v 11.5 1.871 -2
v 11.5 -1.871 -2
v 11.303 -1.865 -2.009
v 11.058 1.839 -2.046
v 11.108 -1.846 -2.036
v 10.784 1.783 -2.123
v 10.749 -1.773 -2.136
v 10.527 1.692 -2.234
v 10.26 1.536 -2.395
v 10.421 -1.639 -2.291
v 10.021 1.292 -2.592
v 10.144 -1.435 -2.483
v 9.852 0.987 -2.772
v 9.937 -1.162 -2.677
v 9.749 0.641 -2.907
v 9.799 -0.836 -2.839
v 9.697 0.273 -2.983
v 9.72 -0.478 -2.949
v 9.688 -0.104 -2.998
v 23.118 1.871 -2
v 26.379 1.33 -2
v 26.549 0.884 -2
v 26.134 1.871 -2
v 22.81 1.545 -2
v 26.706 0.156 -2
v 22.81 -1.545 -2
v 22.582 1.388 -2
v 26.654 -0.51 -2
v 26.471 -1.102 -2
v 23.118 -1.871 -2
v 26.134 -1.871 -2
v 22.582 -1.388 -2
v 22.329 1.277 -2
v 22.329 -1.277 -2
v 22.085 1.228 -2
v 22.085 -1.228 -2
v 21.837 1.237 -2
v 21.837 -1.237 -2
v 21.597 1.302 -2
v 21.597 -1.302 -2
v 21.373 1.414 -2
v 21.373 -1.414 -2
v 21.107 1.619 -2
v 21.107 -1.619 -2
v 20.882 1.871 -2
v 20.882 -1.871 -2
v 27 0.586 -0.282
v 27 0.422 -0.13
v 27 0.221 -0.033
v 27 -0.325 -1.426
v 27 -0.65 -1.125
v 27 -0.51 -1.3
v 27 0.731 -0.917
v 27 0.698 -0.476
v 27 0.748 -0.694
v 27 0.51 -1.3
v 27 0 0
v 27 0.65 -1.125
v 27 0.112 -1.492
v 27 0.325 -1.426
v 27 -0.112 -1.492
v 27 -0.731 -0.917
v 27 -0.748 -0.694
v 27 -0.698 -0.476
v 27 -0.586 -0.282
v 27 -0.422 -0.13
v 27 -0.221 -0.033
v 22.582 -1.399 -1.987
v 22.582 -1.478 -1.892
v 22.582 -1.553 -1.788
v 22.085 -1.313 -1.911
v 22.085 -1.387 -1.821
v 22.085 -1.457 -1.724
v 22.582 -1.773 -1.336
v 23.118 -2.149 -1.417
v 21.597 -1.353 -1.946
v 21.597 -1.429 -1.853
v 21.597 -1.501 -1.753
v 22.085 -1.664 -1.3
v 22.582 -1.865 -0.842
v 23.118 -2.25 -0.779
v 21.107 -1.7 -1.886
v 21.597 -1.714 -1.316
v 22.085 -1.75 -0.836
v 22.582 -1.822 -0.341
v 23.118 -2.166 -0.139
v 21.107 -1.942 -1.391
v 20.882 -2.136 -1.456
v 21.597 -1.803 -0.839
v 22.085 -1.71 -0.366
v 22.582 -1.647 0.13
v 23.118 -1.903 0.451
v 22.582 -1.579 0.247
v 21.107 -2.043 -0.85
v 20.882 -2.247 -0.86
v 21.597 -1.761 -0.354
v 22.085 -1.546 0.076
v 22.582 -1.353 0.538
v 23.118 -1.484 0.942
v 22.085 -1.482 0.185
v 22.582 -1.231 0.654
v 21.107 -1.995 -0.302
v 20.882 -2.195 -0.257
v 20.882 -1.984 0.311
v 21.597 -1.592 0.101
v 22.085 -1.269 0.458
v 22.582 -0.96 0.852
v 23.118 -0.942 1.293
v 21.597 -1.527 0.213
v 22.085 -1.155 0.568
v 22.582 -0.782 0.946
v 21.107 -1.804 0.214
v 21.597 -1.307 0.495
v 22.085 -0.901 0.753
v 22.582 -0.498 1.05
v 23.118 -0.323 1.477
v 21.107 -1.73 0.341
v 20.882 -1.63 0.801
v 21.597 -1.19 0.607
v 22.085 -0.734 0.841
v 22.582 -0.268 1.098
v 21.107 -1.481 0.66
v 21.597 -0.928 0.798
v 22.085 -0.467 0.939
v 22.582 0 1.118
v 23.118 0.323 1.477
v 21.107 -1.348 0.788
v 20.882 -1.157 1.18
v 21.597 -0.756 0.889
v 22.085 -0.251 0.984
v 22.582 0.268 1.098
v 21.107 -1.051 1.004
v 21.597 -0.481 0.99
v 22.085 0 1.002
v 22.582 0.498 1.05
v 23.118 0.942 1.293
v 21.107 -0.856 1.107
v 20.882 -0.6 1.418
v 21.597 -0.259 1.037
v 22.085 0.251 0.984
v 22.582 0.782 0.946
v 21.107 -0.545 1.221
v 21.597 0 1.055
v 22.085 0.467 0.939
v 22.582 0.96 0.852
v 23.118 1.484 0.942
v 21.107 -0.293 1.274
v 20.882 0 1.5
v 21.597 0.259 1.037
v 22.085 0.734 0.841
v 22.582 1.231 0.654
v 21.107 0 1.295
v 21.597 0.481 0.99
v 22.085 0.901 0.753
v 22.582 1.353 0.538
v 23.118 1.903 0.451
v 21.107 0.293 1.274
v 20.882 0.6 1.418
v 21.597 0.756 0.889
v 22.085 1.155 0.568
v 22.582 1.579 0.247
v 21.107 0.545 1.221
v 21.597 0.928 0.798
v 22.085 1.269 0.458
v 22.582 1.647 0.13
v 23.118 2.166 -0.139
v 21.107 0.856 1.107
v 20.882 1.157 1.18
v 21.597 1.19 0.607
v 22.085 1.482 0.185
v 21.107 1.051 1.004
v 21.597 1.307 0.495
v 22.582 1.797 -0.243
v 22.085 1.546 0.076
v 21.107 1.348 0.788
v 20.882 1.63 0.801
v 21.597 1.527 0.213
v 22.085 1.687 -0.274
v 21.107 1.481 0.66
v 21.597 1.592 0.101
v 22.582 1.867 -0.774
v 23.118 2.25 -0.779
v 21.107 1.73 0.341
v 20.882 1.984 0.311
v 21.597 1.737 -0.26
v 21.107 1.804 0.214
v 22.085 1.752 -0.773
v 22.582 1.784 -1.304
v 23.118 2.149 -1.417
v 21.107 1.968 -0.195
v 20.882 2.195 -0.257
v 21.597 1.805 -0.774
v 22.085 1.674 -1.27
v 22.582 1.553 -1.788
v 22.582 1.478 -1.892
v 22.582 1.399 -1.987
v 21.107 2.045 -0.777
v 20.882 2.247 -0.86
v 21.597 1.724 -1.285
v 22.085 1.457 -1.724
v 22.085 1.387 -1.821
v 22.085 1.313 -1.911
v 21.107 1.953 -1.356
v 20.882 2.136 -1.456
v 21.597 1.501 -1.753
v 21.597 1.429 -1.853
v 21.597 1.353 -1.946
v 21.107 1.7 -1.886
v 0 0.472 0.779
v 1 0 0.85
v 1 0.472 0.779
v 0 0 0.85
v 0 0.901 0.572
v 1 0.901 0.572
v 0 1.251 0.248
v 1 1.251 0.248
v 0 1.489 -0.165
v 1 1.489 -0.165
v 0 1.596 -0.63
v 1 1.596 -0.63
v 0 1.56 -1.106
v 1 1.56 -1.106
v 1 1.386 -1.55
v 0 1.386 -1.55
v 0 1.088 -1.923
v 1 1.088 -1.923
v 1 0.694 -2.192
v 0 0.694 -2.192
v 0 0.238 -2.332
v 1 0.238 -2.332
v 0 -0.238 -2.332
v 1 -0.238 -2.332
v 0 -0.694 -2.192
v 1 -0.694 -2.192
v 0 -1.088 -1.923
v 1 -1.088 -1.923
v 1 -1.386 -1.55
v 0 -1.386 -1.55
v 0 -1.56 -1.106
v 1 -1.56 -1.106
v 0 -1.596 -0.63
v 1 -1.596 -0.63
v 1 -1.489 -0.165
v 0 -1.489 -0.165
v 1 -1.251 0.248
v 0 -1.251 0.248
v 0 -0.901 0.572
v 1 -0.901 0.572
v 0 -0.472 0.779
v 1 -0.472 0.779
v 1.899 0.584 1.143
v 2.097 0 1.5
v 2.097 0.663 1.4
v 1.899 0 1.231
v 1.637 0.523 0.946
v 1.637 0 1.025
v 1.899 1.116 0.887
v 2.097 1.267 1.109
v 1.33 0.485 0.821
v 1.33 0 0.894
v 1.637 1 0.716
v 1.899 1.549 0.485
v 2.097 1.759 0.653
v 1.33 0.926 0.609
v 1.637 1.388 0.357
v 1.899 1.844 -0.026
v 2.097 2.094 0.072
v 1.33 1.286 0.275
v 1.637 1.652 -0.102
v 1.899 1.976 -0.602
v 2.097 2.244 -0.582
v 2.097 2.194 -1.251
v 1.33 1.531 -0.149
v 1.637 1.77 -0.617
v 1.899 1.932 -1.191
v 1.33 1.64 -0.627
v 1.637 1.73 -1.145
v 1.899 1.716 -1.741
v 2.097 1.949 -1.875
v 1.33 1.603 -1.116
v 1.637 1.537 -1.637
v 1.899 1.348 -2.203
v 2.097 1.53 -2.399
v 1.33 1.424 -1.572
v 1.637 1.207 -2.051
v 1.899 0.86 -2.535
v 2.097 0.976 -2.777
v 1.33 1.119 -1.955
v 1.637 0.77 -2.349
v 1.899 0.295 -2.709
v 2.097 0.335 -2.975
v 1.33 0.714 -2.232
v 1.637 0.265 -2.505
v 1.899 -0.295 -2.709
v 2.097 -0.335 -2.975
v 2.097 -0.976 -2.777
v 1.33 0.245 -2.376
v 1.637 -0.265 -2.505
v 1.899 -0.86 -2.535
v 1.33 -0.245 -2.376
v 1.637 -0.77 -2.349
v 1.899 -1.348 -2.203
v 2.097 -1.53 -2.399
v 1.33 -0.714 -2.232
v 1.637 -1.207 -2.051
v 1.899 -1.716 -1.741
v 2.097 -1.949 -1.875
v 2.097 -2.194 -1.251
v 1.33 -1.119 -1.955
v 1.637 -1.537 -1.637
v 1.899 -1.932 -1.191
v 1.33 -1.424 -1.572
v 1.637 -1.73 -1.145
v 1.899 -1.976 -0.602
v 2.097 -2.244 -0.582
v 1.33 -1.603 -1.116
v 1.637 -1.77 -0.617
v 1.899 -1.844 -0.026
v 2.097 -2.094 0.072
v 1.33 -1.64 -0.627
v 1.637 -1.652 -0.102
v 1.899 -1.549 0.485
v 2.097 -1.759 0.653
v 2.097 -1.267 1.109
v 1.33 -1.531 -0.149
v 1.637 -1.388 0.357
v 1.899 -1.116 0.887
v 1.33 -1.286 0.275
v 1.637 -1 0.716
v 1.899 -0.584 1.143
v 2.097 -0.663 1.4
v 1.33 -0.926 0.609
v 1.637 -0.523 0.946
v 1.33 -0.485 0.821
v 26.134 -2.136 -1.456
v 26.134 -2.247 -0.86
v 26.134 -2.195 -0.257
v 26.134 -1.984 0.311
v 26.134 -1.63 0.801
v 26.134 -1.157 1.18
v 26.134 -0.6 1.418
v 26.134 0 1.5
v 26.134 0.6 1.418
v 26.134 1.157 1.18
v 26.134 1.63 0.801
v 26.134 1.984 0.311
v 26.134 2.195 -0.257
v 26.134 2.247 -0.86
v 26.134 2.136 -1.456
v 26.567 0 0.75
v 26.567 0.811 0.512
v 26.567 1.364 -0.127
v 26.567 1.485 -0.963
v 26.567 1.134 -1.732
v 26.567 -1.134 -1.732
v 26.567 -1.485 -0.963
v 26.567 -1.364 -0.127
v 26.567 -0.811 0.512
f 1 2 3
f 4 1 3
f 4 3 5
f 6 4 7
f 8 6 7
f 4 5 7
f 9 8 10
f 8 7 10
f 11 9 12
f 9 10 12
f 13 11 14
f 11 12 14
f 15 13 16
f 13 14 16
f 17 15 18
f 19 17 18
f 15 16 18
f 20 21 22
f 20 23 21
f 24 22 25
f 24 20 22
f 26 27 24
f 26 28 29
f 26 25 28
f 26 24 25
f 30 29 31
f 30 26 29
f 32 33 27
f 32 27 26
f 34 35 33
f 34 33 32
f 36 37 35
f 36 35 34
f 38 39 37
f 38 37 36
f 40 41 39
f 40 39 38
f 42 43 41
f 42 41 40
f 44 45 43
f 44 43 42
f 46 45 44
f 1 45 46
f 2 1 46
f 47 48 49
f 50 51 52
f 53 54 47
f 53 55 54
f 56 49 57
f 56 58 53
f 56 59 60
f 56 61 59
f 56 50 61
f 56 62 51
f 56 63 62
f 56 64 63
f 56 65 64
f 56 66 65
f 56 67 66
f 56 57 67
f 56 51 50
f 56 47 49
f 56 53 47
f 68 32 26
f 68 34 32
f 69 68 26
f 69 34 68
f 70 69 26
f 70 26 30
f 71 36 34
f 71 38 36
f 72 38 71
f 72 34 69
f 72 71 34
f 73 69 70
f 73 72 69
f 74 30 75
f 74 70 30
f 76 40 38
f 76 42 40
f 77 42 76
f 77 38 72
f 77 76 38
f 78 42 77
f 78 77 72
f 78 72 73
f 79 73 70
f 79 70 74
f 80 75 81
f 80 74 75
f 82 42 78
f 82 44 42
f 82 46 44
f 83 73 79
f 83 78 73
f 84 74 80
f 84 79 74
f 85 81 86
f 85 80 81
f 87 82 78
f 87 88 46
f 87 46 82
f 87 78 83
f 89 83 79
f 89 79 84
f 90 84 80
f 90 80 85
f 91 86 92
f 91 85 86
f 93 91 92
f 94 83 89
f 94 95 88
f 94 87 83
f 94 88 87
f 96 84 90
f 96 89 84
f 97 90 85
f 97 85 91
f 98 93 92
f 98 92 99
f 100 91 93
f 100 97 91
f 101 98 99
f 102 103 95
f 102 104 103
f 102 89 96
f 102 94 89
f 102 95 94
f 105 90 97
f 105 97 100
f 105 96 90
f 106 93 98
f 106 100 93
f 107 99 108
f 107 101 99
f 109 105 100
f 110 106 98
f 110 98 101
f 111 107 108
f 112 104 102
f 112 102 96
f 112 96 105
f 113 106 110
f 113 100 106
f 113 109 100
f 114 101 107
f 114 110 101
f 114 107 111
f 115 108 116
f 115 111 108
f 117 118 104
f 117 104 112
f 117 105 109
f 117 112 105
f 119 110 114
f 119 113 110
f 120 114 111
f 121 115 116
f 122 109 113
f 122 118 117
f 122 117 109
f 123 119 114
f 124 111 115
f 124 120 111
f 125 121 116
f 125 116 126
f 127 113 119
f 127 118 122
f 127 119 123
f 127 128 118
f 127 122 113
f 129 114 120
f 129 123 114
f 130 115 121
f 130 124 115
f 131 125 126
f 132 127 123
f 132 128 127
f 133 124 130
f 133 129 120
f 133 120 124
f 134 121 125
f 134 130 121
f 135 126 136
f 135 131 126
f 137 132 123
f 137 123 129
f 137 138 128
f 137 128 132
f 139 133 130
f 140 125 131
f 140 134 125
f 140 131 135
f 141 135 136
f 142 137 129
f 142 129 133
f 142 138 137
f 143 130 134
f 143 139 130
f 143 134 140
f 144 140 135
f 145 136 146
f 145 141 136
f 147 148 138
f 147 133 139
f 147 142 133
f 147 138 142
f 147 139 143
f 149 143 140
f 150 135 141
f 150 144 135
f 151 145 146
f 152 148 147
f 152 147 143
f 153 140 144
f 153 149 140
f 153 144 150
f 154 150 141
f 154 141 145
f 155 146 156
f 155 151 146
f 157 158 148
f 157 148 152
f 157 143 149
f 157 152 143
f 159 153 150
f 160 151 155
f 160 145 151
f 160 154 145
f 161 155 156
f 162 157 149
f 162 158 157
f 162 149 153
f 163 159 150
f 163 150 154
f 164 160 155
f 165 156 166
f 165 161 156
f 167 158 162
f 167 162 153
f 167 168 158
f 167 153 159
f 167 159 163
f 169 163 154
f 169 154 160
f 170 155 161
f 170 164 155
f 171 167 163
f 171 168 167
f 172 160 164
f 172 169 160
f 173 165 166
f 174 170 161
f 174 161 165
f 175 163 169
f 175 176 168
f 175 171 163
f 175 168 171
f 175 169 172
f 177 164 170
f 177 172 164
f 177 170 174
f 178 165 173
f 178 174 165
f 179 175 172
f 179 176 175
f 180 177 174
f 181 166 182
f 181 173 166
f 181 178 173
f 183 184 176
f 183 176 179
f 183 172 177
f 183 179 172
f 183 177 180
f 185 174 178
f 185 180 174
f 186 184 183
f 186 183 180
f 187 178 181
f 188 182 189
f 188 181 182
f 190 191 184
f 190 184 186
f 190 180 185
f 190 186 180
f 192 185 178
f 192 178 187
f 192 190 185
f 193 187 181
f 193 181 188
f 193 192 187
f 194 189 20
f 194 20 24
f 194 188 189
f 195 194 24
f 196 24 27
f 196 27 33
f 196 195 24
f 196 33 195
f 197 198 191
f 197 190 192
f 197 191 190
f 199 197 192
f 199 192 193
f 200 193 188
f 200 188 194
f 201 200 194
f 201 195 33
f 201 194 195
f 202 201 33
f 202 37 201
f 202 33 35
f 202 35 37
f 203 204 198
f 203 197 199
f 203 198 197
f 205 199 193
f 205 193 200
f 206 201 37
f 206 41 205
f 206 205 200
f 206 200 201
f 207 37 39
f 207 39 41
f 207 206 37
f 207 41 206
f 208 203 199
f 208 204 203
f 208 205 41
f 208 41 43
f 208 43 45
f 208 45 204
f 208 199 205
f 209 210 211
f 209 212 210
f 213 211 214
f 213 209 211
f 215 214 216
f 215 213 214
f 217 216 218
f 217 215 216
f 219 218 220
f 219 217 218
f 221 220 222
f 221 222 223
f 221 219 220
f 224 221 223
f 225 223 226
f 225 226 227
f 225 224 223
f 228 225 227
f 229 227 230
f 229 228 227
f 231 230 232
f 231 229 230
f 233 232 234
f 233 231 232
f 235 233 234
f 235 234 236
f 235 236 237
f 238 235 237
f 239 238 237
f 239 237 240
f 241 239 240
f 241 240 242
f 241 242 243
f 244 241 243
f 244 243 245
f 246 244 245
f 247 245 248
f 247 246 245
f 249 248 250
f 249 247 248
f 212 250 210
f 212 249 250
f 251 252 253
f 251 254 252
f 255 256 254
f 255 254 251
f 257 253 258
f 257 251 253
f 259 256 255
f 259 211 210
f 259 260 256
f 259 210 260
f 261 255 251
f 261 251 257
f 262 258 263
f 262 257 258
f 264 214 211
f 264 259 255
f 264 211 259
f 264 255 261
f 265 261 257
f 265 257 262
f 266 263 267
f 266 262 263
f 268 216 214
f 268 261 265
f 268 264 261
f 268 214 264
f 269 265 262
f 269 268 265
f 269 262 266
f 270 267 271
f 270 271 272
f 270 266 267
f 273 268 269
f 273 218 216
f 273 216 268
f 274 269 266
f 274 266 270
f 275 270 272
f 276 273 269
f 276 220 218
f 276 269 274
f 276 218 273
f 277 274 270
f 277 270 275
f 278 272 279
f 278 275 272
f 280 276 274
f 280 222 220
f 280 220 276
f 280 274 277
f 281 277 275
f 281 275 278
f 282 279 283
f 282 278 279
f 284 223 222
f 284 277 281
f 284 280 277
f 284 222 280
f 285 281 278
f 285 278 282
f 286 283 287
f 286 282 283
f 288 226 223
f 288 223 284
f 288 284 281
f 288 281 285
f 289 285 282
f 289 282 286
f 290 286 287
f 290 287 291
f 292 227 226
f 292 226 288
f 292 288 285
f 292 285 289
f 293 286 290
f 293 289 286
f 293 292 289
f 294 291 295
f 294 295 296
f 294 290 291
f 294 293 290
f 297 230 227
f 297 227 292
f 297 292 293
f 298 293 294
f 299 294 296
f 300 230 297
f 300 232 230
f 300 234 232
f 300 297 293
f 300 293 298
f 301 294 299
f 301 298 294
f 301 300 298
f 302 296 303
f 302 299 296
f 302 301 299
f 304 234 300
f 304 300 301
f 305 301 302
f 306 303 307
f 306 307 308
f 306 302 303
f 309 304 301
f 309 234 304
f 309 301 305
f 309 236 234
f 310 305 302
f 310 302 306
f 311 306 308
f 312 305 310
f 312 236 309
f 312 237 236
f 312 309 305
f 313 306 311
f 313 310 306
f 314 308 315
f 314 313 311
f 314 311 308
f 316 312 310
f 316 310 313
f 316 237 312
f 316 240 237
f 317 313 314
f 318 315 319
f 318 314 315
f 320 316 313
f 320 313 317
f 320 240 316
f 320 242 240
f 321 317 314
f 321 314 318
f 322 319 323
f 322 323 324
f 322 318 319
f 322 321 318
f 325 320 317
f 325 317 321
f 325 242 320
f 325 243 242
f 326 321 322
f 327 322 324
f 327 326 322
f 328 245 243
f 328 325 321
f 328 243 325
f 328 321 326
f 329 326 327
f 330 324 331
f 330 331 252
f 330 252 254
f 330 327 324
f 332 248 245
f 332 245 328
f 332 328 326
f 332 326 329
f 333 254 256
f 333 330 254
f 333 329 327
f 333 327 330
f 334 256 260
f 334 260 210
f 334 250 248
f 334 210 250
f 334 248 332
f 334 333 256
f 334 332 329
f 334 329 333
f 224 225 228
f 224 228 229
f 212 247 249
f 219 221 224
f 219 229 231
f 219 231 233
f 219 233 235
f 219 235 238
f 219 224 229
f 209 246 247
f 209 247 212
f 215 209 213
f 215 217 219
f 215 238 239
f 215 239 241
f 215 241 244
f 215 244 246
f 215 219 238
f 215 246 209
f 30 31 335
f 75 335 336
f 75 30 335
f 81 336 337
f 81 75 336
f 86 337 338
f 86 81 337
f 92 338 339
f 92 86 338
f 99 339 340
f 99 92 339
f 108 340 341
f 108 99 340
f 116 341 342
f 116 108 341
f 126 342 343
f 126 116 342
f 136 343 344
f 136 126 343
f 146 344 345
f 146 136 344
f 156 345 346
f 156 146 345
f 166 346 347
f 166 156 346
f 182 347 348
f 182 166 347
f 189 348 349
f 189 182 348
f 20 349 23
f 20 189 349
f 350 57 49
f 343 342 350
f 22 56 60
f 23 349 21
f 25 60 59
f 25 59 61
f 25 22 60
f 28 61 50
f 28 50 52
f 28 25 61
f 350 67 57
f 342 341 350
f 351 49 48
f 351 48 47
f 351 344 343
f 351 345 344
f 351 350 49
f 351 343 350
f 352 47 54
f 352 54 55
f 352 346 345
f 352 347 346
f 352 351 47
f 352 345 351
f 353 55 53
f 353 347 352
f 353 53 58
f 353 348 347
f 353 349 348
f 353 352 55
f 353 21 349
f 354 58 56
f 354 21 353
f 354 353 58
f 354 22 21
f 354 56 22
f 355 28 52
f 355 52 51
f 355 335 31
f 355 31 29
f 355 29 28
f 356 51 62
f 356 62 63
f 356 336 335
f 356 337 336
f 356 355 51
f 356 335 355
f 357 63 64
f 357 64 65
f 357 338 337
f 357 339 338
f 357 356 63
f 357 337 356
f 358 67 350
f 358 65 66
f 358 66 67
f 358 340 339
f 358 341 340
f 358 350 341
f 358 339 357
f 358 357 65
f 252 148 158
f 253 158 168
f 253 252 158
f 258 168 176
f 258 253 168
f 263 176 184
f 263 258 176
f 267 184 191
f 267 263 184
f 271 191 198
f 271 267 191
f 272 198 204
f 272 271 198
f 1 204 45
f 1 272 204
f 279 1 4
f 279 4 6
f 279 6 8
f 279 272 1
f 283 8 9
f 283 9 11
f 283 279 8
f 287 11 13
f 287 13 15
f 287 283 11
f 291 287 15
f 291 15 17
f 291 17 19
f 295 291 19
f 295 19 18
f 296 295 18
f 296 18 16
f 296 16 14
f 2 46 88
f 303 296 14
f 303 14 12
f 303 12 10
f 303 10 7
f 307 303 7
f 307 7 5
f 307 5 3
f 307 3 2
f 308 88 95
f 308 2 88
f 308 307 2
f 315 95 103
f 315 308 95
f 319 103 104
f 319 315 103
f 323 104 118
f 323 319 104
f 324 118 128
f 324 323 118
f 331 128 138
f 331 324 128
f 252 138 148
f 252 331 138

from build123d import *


with BuildPart() as f1:
    # F0 (on Front) → F1 (revolve)
    with BuildSketch(Plane.XZ):
        with BuildLine():
            Line((1, 0.85), (0, 0.85))
            Line((0, 0.85), (0, -0.75))
            Line((0, -0.75), (27, -0.75))
            Line((27, -0.75), (27, 0))
            Line((27, 0), (26.1339745962, 1.5))
            Line((26.1339745962, 1.5), (23.1180339887, 1.5))
            ThreePointArc((23.1180339887, 1.5), (22, 1), (20.8819660113, 1.5))
            Line((20.8819660113, 1.5), (2.09658561, 1.5))
            ThreePointArc((2.09658561, 1.5), (1.6373774392, 1.0247093416), (1, 0.85))
        make_face()
    revolve(axis=Axis((13.5, 0, -0.75), (-1, 0, 0)))

    # F5: sweep along a path in F4
    with BuildLine(Plane.XZ) as f5_path:
        Line((27, -2), (11.5, -2))
        ThreePointArc((11.5, -2), (10.4339207347, -2.2837767539), (9.65, -3.06))
    # F3 (on offset) → F5 (sweep, cut)
    with BuildSketch(Plane.YZ.offset(27)):
        Polygon((2.380318353, -2), (0, -2), (-2.619681647, -2), (-2.619681647, -3), (2.380318353, -3), align=None)
    sweep(path=f5_path.line, mode=Mode.SUBTRACT)


solid = f1.part
